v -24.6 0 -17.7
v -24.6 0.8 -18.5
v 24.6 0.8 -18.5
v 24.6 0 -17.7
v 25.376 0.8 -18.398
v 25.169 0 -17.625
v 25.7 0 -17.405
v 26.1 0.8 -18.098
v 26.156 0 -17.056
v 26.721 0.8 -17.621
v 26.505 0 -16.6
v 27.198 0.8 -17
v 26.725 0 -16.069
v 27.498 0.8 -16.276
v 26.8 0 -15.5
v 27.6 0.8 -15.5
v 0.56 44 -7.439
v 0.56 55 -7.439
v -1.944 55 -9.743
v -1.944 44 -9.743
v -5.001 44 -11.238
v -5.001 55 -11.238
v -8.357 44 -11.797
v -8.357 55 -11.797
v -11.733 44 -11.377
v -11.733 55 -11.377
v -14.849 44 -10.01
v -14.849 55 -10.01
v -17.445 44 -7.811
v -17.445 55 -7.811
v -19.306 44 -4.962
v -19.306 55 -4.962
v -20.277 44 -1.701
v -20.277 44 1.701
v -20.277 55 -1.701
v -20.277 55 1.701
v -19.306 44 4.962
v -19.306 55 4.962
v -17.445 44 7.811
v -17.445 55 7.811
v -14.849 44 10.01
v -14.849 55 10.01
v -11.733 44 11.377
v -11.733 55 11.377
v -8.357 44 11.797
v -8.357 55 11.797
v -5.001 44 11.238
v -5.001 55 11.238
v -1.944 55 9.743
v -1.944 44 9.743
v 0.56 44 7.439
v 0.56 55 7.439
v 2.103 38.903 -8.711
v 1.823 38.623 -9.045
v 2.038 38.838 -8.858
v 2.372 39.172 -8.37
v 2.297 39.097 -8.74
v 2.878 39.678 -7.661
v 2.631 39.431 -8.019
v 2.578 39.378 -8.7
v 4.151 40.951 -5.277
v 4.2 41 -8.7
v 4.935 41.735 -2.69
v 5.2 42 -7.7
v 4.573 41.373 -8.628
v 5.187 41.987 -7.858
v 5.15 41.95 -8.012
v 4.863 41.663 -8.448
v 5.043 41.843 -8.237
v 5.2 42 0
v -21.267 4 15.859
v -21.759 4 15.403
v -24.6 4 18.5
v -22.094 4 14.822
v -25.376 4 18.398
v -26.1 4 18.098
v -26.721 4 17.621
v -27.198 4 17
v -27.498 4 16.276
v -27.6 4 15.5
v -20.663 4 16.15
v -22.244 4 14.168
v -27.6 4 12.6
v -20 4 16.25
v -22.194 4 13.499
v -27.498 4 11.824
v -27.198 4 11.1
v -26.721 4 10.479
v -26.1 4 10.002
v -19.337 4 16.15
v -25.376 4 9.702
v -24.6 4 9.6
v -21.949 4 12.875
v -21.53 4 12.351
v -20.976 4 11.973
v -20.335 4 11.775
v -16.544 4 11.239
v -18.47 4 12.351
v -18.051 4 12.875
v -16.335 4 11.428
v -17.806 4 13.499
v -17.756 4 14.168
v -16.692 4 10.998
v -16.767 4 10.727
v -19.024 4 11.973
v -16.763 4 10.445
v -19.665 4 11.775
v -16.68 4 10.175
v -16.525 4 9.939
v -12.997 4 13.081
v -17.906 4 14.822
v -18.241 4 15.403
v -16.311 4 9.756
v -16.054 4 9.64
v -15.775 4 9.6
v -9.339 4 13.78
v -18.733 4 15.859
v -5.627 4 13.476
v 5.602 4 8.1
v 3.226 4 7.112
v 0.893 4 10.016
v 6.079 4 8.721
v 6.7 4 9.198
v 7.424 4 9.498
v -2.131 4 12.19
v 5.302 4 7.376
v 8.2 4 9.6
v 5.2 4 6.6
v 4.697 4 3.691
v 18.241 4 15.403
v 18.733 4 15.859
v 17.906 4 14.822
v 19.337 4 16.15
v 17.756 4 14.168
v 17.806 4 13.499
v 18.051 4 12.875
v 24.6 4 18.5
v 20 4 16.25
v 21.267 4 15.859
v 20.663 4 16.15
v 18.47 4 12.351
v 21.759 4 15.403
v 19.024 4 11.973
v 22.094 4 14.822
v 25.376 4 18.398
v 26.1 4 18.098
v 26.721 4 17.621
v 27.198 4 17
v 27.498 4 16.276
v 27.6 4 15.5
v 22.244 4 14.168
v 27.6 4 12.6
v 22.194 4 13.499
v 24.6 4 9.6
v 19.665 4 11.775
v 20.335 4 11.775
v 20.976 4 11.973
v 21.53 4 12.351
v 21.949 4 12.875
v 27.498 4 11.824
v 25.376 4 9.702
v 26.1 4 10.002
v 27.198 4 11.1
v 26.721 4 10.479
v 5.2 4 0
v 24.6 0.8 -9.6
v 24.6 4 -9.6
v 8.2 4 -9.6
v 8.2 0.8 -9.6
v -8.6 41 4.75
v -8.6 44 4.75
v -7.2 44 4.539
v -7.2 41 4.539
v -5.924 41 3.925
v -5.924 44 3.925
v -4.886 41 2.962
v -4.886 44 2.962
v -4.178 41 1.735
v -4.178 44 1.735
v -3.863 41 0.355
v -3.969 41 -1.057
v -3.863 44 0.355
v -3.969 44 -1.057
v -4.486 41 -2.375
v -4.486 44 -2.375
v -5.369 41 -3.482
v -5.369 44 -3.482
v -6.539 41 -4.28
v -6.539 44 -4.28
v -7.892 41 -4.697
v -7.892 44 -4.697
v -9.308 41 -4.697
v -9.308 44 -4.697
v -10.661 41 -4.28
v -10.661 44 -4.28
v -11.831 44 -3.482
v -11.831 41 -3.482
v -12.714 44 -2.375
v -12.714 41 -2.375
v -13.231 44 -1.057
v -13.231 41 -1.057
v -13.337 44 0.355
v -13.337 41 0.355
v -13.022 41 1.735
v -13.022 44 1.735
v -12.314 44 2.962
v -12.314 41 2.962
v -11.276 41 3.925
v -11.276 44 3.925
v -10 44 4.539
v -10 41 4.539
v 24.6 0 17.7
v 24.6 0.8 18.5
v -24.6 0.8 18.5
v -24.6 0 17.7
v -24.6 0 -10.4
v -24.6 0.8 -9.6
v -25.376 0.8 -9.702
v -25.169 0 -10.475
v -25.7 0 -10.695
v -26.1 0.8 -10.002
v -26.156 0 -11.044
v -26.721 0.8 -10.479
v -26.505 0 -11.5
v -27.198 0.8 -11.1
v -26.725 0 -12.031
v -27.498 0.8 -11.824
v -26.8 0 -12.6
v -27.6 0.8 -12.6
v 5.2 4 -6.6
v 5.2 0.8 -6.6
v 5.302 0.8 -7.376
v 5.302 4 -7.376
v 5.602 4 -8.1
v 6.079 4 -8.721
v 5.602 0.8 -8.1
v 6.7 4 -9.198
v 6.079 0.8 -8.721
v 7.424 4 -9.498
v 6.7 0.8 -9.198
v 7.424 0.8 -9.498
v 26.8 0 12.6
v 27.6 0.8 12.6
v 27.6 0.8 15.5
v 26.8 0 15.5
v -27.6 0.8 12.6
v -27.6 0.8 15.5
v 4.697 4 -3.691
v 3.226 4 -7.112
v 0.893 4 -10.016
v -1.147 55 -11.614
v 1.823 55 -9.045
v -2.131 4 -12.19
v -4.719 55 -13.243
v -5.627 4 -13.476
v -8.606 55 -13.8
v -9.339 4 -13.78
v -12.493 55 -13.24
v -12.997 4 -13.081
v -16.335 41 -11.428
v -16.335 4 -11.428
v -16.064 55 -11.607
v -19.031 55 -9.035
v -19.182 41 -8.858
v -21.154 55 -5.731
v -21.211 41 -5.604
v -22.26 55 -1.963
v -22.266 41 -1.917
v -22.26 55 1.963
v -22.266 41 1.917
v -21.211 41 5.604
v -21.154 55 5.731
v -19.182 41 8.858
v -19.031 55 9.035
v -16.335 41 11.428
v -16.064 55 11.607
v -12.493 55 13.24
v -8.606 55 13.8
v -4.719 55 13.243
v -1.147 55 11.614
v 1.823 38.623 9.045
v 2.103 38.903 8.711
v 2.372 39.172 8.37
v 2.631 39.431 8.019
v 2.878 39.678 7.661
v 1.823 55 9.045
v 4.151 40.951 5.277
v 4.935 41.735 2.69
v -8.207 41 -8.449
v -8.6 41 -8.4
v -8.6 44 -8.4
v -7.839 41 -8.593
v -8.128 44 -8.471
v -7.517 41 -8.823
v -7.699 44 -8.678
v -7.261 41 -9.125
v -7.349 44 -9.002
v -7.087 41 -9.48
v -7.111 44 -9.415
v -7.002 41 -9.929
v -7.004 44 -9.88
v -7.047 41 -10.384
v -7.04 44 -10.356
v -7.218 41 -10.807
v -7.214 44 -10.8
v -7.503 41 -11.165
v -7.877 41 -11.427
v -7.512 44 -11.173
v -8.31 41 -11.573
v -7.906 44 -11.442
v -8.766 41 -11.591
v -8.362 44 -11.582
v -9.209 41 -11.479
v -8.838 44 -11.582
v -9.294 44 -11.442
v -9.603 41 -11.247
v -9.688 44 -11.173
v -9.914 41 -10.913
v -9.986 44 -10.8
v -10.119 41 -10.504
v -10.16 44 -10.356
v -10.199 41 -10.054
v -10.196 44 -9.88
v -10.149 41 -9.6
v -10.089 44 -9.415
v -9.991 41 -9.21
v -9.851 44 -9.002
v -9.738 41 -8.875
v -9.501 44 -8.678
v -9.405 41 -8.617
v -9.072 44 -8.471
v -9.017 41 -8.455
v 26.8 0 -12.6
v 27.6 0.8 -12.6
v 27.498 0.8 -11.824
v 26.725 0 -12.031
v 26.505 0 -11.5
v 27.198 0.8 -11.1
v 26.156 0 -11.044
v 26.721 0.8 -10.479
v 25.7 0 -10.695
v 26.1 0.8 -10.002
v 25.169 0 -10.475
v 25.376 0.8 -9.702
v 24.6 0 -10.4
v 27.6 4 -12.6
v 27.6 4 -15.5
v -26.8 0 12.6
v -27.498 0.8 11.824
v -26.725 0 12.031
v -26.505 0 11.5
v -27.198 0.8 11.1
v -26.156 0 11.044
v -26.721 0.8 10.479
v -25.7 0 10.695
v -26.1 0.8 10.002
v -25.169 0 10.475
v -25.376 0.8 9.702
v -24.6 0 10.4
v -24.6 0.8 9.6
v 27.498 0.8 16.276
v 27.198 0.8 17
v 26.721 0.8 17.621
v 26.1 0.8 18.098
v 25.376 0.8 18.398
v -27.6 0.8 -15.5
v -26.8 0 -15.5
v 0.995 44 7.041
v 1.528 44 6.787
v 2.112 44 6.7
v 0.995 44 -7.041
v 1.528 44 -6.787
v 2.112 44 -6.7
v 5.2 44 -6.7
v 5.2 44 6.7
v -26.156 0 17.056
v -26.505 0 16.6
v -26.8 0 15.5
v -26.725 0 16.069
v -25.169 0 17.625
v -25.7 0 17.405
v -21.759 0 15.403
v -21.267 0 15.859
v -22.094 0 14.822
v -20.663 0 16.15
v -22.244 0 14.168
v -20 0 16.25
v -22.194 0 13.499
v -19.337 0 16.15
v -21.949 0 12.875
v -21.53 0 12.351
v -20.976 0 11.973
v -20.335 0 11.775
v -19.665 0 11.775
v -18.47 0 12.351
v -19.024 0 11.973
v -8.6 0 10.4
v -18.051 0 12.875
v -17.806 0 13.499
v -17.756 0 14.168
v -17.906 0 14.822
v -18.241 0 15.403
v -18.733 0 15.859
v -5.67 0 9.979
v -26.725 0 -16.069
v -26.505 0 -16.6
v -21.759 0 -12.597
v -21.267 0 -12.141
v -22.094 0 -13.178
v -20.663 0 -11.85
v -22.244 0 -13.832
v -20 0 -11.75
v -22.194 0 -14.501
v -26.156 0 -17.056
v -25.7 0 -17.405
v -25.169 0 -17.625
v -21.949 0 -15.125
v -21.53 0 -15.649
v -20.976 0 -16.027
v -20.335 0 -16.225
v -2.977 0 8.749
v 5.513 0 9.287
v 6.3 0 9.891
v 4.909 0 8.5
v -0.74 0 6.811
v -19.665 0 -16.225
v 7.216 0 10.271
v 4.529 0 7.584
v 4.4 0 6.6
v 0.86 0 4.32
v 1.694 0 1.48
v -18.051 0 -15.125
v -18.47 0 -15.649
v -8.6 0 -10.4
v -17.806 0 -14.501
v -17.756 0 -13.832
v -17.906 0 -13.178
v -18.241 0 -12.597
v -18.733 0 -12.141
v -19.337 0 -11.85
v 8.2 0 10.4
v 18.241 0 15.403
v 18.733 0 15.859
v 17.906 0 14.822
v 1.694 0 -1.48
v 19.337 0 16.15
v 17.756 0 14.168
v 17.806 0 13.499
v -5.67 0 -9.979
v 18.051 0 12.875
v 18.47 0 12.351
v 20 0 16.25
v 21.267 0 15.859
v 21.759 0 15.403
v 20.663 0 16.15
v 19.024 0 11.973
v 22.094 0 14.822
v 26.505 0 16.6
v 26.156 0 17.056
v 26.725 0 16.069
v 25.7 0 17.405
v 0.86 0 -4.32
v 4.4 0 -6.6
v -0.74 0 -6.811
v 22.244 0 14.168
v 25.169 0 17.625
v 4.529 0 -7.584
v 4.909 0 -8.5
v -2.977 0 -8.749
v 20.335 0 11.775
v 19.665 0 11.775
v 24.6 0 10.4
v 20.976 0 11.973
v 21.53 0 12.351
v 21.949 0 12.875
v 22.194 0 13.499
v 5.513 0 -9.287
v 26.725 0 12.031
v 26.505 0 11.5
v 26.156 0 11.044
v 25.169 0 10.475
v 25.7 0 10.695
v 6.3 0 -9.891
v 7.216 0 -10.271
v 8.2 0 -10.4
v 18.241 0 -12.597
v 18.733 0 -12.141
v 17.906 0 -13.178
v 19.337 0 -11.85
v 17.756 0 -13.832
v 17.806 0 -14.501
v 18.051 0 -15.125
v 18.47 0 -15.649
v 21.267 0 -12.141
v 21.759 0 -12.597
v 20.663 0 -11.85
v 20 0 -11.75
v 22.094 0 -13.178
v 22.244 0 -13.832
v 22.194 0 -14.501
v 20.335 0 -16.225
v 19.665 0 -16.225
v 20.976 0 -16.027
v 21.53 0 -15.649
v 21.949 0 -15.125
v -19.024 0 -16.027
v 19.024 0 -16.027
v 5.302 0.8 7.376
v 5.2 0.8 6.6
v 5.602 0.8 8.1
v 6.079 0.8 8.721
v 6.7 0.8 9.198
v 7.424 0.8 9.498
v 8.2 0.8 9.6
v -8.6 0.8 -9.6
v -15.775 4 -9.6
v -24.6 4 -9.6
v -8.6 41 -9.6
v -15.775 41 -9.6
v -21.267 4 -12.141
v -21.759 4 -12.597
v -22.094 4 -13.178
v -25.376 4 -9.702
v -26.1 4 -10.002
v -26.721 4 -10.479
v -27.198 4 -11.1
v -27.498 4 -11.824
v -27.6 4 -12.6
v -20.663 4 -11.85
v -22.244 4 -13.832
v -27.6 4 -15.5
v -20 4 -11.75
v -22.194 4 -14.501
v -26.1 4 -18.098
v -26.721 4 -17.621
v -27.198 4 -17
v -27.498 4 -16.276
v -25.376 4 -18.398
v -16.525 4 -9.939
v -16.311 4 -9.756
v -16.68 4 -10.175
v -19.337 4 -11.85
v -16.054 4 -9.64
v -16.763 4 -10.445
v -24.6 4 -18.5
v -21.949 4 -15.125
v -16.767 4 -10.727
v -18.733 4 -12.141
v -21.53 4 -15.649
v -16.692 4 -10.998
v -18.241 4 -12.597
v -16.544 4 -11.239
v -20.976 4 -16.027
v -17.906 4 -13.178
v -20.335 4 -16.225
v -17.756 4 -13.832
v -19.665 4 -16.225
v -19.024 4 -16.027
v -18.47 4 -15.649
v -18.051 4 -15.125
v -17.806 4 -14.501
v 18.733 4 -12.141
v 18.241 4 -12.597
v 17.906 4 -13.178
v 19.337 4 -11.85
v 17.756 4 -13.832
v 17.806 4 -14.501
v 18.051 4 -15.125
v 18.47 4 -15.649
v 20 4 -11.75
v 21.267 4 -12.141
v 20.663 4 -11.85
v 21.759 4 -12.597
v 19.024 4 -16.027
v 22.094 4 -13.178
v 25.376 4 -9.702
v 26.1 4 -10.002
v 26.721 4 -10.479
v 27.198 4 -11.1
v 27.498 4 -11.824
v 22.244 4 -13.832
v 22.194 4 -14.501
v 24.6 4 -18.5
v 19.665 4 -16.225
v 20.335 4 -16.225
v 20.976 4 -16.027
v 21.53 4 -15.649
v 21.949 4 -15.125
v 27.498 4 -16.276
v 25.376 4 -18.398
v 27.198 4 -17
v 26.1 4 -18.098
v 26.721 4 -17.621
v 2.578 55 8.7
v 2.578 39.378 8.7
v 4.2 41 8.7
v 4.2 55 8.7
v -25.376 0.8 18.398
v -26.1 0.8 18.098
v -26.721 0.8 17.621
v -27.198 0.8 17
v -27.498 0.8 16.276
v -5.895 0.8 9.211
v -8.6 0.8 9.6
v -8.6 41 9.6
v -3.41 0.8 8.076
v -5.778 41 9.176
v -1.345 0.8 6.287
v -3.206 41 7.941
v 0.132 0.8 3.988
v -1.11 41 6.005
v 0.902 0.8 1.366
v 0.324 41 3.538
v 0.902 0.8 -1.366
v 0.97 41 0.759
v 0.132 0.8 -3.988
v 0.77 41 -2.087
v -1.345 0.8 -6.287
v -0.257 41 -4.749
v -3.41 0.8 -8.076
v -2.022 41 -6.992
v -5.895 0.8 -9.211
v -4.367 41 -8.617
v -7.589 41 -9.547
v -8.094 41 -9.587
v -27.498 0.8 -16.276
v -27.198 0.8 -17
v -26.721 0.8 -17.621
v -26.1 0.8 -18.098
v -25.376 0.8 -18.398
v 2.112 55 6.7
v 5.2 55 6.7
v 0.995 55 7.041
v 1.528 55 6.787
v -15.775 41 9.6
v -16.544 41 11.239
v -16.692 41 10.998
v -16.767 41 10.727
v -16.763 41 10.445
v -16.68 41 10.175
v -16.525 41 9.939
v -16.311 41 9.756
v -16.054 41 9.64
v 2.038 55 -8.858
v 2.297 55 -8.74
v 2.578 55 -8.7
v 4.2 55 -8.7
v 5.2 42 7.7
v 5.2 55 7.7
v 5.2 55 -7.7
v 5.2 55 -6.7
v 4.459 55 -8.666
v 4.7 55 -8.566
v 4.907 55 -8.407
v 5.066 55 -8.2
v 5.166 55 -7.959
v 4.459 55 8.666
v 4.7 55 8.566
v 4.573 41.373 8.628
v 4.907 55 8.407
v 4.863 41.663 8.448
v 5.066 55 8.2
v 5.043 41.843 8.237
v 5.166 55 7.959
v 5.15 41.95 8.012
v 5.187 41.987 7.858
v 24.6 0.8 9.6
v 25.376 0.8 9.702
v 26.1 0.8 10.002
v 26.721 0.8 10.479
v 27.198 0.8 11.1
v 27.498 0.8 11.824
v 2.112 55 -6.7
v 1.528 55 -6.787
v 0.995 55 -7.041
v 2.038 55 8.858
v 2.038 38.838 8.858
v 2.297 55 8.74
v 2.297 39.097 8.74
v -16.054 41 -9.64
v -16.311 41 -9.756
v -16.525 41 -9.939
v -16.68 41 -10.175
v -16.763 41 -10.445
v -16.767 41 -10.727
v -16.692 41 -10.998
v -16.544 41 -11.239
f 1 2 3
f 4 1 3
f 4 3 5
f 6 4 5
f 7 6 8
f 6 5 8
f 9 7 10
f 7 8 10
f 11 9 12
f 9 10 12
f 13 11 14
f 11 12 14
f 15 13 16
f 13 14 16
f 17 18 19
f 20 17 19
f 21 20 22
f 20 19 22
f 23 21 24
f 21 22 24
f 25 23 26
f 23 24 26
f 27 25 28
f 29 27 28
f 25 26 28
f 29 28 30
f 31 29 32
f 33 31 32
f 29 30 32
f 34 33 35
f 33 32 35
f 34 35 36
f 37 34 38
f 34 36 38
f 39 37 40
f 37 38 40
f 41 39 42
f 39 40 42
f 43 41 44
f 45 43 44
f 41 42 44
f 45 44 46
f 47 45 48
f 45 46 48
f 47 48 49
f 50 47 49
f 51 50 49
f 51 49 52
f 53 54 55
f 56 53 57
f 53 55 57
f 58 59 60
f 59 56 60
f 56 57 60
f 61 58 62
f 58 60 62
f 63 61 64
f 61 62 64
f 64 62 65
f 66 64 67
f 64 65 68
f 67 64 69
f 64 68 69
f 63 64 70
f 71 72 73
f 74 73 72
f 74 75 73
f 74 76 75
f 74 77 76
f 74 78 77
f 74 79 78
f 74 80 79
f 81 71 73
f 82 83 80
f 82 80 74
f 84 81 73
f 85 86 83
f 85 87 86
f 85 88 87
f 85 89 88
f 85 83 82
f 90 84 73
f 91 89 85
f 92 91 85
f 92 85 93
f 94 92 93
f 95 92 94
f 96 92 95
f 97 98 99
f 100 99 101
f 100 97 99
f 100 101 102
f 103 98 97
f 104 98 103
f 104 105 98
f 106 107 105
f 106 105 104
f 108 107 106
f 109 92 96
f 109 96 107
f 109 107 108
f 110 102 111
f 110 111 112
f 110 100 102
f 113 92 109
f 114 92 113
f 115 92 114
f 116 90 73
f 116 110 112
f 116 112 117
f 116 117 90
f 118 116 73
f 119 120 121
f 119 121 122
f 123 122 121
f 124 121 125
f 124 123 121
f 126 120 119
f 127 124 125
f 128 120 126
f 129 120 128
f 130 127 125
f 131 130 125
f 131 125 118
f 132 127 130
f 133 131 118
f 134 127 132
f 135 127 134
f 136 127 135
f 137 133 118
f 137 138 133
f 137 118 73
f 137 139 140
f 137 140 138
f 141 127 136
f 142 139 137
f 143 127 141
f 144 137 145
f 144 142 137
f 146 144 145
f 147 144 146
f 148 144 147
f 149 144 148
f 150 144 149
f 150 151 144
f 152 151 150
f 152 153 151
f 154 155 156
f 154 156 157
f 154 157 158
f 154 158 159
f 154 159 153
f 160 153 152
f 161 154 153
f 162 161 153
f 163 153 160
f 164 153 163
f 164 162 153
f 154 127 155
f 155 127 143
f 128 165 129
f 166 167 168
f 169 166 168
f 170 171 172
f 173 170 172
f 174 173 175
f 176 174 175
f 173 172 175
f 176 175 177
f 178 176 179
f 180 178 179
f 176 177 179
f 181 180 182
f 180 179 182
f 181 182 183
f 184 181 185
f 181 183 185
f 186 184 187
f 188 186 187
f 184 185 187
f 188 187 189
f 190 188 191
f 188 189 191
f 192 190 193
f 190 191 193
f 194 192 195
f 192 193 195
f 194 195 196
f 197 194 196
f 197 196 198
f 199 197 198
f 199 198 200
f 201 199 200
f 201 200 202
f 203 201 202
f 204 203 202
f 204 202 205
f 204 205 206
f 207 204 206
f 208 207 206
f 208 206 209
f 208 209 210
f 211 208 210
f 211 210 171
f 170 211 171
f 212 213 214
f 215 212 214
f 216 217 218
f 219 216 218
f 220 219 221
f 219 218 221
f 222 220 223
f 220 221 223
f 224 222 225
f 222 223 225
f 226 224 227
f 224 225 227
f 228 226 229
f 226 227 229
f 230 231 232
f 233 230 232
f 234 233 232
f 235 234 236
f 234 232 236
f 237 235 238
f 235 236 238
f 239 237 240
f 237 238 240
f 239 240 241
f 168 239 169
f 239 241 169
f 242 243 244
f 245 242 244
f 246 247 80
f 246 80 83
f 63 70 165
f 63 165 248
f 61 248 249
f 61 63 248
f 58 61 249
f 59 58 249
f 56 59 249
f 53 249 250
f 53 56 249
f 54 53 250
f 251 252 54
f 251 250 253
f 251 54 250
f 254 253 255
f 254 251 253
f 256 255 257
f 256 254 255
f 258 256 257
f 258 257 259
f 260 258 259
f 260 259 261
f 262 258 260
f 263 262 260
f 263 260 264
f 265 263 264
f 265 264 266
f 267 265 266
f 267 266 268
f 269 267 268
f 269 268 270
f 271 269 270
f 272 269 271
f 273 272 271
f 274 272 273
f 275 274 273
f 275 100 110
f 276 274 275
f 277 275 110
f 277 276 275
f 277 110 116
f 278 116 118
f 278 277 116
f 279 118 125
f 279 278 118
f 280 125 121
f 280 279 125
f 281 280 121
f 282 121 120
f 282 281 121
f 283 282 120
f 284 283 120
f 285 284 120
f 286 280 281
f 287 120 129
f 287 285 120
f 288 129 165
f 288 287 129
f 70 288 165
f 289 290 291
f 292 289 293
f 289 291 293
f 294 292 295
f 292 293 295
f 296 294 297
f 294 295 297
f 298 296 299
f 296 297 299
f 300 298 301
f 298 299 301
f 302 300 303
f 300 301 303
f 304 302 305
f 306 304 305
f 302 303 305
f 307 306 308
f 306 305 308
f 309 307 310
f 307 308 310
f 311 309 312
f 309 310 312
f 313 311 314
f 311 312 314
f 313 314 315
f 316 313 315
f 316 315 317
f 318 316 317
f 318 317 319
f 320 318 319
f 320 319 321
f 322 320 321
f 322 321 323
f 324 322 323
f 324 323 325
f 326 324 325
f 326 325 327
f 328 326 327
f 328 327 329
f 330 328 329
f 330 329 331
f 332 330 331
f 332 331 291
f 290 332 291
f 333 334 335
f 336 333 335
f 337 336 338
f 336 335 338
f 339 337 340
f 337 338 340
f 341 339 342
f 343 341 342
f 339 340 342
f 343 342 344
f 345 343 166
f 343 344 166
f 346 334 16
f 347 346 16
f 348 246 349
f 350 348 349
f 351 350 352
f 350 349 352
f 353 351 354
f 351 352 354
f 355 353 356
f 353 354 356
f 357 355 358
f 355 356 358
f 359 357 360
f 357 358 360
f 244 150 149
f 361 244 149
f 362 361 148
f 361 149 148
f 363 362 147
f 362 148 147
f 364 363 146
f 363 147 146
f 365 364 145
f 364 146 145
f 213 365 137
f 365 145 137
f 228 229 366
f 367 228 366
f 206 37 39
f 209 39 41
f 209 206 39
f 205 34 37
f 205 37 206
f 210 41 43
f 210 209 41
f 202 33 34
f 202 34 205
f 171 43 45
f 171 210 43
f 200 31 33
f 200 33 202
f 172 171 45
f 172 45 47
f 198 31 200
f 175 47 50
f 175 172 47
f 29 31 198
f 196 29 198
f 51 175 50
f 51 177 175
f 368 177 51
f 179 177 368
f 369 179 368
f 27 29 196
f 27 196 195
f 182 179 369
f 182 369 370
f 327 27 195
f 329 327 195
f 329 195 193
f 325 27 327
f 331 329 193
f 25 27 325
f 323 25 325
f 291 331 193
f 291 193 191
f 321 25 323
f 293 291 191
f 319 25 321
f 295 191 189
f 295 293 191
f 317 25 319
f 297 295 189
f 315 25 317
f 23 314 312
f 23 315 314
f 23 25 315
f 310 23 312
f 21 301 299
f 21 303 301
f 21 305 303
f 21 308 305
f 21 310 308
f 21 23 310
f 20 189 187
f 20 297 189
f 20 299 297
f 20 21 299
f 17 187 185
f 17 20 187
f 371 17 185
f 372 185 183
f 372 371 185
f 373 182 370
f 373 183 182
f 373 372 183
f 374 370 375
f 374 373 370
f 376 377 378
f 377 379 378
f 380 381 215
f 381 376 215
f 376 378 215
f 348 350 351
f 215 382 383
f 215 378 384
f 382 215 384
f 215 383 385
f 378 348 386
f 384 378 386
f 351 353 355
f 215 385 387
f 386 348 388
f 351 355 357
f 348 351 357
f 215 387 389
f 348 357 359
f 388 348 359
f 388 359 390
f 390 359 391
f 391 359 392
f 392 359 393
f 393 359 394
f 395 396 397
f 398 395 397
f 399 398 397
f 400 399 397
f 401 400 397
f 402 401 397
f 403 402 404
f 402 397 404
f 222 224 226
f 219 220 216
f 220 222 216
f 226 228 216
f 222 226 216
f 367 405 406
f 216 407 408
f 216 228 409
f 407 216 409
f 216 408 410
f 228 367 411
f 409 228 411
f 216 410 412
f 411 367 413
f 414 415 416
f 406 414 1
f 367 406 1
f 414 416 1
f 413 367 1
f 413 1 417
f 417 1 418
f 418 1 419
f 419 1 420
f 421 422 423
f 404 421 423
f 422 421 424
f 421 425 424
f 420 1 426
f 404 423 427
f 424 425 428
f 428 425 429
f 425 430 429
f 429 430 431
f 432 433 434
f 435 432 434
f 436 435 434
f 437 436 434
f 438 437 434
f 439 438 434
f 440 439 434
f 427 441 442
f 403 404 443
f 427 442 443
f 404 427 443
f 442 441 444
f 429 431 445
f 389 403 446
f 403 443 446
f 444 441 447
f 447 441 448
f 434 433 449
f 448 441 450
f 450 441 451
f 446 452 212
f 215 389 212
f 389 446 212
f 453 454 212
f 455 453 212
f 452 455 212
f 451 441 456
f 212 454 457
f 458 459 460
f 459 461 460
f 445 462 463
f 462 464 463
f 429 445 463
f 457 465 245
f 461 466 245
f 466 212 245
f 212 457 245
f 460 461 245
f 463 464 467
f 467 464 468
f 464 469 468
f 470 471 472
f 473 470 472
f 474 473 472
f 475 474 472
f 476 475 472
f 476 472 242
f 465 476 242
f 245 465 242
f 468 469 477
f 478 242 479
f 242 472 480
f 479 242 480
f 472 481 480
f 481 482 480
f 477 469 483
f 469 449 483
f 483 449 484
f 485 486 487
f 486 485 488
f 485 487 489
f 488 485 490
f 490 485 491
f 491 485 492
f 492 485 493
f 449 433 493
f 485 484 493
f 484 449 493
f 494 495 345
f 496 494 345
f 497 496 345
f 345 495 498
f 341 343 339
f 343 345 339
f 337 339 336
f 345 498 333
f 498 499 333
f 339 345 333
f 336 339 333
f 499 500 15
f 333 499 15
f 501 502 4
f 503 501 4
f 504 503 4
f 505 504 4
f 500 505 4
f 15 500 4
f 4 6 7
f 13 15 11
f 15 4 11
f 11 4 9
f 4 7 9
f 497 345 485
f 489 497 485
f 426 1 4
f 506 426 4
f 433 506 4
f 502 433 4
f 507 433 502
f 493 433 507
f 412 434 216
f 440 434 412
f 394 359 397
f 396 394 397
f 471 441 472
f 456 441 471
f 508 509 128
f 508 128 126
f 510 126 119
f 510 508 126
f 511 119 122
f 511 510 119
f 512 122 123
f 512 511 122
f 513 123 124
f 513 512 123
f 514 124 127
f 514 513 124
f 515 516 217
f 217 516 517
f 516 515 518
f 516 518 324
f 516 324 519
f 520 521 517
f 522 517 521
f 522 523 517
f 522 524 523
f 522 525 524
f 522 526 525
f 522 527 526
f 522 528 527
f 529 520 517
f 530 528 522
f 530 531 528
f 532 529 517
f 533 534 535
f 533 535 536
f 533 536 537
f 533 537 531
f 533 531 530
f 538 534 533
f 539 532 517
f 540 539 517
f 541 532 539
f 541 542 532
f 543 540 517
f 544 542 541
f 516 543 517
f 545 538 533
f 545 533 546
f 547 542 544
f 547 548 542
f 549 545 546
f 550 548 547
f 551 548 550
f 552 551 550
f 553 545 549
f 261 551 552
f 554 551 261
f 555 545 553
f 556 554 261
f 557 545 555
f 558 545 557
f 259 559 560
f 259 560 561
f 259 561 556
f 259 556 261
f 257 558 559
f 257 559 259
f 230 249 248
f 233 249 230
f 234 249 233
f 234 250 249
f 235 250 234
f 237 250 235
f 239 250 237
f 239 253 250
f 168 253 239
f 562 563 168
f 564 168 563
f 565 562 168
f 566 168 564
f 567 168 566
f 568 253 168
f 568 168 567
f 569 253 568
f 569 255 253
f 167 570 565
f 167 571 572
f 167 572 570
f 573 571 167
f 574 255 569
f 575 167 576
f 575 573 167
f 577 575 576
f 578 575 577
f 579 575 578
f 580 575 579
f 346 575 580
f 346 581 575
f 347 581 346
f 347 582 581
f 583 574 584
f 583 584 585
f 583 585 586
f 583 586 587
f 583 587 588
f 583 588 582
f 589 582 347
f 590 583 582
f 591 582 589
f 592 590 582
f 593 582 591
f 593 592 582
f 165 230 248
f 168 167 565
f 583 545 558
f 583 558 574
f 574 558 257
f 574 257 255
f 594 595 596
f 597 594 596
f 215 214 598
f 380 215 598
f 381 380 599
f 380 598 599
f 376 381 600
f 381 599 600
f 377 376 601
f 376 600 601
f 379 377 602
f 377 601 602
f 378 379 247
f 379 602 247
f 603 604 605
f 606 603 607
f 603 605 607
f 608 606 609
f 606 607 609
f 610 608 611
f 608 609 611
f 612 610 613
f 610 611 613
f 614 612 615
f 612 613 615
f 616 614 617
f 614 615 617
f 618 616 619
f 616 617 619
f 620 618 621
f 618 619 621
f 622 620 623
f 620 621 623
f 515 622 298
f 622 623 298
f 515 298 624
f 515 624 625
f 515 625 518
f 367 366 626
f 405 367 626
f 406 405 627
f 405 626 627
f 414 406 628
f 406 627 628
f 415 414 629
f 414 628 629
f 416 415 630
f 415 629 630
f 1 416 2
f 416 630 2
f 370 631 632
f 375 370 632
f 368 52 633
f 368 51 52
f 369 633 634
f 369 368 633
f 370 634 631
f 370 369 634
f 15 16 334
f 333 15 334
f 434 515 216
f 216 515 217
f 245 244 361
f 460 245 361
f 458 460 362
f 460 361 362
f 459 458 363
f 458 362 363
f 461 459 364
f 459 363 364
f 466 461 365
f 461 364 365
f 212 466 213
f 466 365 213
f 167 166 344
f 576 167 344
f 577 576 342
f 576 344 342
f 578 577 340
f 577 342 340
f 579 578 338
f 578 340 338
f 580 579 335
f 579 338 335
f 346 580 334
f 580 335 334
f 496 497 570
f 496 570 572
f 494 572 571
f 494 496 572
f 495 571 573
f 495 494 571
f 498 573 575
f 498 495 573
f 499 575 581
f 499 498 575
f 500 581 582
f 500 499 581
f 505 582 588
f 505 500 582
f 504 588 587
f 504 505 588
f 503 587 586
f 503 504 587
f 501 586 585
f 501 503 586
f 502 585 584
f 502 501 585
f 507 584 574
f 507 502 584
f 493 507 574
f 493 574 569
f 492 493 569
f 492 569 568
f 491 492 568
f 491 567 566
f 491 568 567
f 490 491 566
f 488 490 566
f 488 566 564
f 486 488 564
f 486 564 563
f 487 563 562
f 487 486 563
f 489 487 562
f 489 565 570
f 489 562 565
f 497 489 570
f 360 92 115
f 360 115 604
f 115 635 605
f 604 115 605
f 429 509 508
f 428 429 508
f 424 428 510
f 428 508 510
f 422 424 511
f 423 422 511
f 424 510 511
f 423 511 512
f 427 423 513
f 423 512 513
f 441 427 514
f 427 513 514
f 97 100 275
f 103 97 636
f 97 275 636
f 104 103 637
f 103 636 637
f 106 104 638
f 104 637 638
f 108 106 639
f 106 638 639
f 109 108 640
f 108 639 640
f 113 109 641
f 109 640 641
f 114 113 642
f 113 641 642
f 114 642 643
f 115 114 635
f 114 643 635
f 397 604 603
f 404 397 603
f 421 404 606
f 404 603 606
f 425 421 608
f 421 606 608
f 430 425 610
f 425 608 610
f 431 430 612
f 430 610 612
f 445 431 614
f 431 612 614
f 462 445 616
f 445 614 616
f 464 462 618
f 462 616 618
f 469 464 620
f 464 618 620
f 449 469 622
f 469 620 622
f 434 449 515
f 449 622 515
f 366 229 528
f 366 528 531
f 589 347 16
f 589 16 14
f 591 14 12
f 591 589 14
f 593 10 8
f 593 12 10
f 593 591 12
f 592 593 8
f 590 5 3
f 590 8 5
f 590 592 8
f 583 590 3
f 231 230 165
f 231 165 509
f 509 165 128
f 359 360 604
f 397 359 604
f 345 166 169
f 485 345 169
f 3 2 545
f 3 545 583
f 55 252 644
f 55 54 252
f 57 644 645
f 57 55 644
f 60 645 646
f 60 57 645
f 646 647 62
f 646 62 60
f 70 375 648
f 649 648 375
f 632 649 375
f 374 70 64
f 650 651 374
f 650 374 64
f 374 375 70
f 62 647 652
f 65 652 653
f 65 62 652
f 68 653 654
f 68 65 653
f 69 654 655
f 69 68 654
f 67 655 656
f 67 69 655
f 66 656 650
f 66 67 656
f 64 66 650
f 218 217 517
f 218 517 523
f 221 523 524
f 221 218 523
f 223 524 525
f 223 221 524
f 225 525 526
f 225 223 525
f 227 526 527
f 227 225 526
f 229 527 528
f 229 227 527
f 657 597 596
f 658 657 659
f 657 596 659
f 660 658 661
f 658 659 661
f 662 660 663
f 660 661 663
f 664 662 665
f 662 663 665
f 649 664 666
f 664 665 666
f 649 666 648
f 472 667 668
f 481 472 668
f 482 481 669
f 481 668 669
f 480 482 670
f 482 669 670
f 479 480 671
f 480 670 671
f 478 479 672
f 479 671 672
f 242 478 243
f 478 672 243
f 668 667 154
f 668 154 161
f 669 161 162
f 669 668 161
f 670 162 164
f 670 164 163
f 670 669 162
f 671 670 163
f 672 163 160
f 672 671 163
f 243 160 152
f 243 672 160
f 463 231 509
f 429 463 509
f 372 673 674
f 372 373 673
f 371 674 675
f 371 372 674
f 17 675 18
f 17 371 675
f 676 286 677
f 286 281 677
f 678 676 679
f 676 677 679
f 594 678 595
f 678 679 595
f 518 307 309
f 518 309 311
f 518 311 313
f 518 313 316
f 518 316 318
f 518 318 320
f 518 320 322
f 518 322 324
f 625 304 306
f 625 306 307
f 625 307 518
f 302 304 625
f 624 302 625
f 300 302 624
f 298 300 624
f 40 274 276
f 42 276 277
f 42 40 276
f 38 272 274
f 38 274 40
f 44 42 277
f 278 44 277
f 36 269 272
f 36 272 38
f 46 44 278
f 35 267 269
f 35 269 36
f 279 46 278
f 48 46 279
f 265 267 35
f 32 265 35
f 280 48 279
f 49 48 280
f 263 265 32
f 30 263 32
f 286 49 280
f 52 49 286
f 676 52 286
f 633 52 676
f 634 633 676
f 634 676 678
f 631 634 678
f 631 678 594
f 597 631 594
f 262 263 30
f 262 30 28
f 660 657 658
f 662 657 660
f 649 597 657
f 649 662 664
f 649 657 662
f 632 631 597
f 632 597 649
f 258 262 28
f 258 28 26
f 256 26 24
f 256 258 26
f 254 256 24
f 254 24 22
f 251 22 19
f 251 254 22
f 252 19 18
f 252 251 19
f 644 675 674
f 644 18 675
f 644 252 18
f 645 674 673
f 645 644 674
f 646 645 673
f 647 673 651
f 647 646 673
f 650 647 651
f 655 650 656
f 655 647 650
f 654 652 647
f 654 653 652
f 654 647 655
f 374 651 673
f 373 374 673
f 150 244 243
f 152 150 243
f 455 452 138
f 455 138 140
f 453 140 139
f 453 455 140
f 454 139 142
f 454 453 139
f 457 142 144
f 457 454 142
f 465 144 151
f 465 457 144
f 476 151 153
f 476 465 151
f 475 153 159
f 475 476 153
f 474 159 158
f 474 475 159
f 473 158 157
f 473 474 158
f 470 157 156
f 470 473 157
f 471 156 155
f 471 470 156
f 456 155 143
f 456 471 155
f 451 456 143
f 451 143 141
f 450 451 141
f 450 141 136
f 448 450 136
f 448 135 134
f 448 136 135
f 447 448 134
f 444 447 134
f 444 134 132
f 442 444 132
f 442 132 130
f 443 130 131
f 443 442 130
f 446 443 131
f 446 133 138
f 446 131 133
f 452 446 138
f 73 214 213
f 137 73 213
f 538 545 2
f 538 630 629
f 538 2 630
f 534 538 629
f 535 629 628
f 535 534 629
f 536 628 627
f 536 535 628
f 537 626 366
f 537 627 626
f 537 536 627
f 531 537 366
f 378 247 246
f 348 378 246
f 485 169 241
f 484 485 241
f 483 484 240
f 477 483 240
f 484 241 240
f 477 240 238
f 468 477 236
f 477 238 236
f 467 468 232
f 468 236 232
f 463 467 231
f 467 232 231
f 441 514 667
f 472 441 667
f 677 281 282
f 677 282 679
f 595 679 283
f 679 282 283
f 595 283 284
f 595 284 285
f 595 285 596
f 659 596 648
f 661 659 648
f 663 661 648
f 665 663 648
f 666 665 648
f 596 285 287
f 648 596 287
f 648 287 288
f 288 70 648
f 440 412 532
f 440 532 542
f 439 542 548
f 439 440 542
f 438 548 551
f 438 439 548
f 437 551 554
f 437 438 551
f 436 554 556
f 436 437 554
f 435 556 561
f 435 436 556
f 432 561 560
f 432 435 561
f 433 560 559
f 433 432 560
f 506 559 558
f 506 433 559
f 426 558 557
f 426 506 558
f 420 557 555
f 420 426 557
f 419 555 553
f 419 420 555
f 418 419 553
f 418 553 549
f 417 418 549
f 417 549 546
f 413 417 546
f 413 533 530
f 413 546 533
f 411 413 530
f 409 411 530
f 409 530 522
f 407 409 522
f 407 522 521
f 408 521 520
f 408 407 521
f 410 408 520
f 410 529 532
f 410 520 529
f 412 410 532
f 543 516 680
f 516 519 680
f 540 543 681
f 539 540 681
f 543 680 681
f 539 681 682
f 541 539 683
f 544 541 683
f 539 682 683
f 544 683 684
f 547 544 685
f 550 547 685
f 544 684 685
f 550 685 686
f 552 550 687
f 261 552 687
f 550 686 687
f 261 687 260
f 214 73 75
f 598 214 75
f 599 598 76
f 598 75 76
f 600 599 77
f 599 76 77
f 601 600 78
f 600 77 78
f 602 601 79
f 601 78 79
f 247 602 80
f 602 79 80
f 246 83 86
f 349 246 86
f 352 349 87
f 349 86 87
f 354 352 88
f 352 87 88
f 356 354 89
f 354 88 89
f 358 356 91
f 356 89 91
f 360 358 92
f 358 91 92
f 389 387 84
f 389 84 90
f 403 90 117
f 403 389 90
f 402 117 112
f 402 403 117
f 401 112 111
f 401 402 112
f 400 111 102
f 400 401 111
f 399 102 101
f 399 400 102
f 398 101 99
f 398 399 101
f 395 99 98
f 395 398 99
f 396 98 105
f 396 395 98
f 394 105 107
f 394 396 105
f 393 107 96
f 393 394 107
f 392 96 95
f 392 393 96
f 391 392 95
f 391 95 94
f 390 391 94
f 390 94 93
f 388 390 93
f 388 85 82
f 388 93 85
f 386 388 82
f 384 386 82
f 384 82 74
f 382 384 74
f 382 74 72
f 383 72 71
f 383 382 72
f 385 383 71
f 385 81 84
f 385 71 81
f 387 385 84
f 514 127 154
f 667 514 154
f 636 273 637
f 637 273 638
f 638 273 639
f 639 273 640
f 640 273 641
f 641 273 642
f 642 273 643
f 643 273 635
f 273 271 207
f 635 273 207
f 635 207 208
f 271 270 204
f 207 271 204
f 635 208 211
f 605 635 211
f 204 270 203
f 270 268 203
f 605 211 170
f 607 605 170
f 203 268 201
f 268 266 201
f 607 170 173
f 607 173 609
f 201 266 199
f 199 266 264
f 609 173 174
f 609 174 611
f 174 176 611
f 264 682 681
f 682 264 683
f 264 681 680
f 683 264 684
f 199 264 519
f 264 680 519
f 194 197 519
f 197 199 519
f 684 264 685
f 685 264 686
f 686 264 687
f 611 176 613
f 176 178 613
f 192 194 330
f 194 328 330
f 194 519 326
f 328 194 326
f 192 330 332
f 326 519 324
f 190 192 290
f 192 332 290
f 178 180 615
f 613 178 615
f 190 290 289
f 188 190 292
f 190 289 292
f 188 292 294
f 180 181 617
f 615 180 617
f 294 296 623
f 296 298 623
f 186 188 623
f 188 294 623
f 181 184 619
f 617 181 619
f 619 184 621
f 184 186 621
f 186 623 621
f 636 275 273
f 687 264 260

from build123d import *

# Parameters (mm, degrees)
SKETCH5_R                = 13.8
BOSS_EXTRUDE10_DEPTH     = 55
BOSS_EXTRUDE13_DEPTH     = 13
SKETCH7_W                = 55.2
SKETCH7_H                = 37
BOSS_EXTRUDE11_DEPTH     = 4
SKETCH14_R               = 9.6
CUT_EXTRUDE9_DEPTH       = 53.773193953
FILLET1_R                = 1
FILLET3_R                = 3
CUT_EXTRUDE11_DEPTH      = 65.257373118
CUT_EXTRUDE11_DEPTH_BACK = 65.257373118
SKETCH2_R                = 2.25
CUT_EXTRUDE12_DEPTH      = 11
CHAMFER1_SIZE            = 0.8
FILLET7_R                = 1
SKETCH16_R               = 4.75
CUT_EXTRUDE13_DEPTH      = 56.136285693
SKETCH17_R               = 1.6
CUT_EXTRUDE14_DEPTH      = 3
FILLET8_R                = 2
DRAFT1_ANGLE             = 45


with BuildPart() as part:
    # Sketch5 → Boss-Extrude10 (new body)
    with BuildSketch(Plane(origin=(0, 55, 0), x_dir=(1, 0, 0), z_dir=(0, 1, 0))):
        with Locations((-8.6, 0)):
            Circle(SKETCH5_R)
    extrude(amount=-BOSS_EXTRUDE10_DEPTH)

    # Sketch5<9> → Boss-Extrude13 (add)
    with BuildSketch(Plane(origin=(0, 55, 0), x_dir=(1, 0, 0), z_dir=(0, 1, 0))):
        with BuildLine():
            Line((5.2, -8.7), (5.2, 8.4e-08))
            ThreePointArc((5.2, 8.4e-08), (4.405144544, -4.615865618), (2.112142643, -8.7))
            Line((2.112142643, -8.7), (5.2, -8.7))
        make_face()
        with BuildLine():
            Line((5.2, 8.4e-08), (5.2, 8.7))
            Line((5.2, 8.7), (2.112142643, 8.7))
            ThreePointArc((2.112142643, 8.7), (4.405144516, 4.615865697), (5.2, 8.4e-08))
        make_face()
    extrude(amount=-BOSS_EXTRUDE13_DEPTH)

    # Sketch7 → Boss-Extrude11 (add)
    with BuildSketch(Plane(origin=(0, 0, 0), x_dir=(1, 0, 0), z_dir=(0, 1, 0))):
        Rectangle(SKETCH7_W, SKETCH7_H)
    extrude(amount=BOSS_EXTRUDE11_DEPTH)

    # Sketch14 → Cut-Extrude9 (cut, through all)
    with BuildSketch(Plane(origin=(0, 41, 0), x_dir=(1, 0, 0), z_dir=(0, 1, 0))):
        with BuildLine():
            Line((-28.6, -9.6), (-8.6, -9.6))
            ThreePointArc((-8.6, -9.6), (-18.2, 0), (-8.6, 9.6))
            Line((-8.6, 9.6), (-28.6, 9.6))
            Line((-28.6, 9.6), (-28.6, -9.6))
        make_face()
        with Locations((-8.6, 0)):
            Circle(SKETCH14_R)
        Polygon((5.2, -9.6), (27.6, -9.6), (27.6, 9.6), (5.2, 9.6), (5.2, 0), align=None)
    extrude(amount=-CUT_EXTRUDE9_DEPTH, mode=Mode.SUBTRACT)

    # Fillet1
    fillet1_edges = [part.edges().sort_by_distance(p)[0] for p in [
        (-18.513626985, 22.5, -9.6),
        (-18.513626985, 22.5, 9.6),
    ]]
    fillet(fillet1_edges, radius=FILLET1_R)

    # Fillet3
    fillet3_edges = [part.edges().sort_by_distance(p)[0] for p in [
        (27.6, 2, -18.5),
        (-27.6, 2, -18.5),
        (-27.6, 2, 18.5),
        (27.6, 2, 18.5),
        (-27.6, 2, -9.6),
        (-27.6, 2, 9.6),
        (5.2, 2, 9.6),
        (5.2, 2, -9.6),
        (27.6, 2, -9.6),
        (27.6, 2, 9.6),
    ]]
    fillet(fillet3_edges, radius=FILLET3_R)

    # Sketch2 → Cut-Extrude11 (cut, two sides: drawn at the far end of the back side and taken through both)
    with BuildSketch(Plane(origin=(0, 0, 0), x_dir=(1, 0, 0), z_dir=(0, 1, 0)).offset(-CUT_EXTRUDE11_DEPTH_BACK)):
        with Locations(Location((-20, 14, 0), (0, 0, 270))):
            Circle(SKETCH2_R)
        with Locations(Location((20, 14, 0), (0, 0, 270))):
            Circle(SKETCH2_R)
        with Locations(Location((20, -14, 0), (0, 0, 270))):
            Circle(SKETCH2_R)
        with Locations(Location((-20, -14, 0), (0, 0, 270))):
            Circle(SKETCH2_R)
    extrude(amount=CUT_EXTRUDE11_DEPTH + CUT_EXTRUDE11_DEPTH_BACK, mode=Mode.SUBTRACT)

    # Sketch15 → Cut-Extrude12 (cut)
    with BuildSketch(Plane(origin=(0, 55, 0), x_dir=(1, 0, 0), z_dir=(0, 1, 0))):
        with BuildLine():
            Line((4.1, -6.7), (5.2, -6.7))
            Line((5.2, -6.7), (5.2, 6.7))
            Line((5.2, 6.7), (4.1, 6.7))
            Line((4.1, 6.7), (1.113392816, 6.7))
            ThreePointArc((1.113392816, 6.7), (-20.4, 0), (1.113392816, -6.7))
            Line((1.113392816, -6.7), (4.1, -6.7))
        make_face()
    extrude(amount=-CUT_EXTRUDE12_DEPTH, mode=Mode.SUBTRACT)

    # Chamfer1
    chamfer1_edges = [part.edges().sort_by_distance(p)[0] for p in [
        (16.4, 0, -9.6),
        (27.6, 0, -14.05),
        (-27.6, 0, -14.05),
        (0, 0, -18.5),
        (5.2, 0, 0),
        (16.4, 0, 9.6),
        (27.6, 0, 14.05),
        (0, 0, 18.5),
        (-27.6, 0, 14.05),
        (-26.721320344, 0, 17.621320344),
        (26.721320344, 0, 17.621320344),
        (26.721320344, 0, -17.621320344),
        (-26.721320344, 0, -17.621320344),
        (-26.721320344, 0, -10.478679656),
        (-26.721320344, 0, 10.478679656),
        (26.721320344, 0, 10.478679656),
        (26.721320344, 0, -10.478679656),
        (6.078679656, 0, -8.721320344),
        (6.078679656, 0, 8.721320344),
        (-16.6, 0, 9.6),
        (-16.6, 0, -9.6),
        (1, 0, 0),
    ]]
    chamfer(chamfer1_edges, length=CHAMFER1_SIZE)

    # Fillet7
    fillet7_edges = [part.edges().sort_by_distance(p)[0] for p in [
        (5.2, 48.5, 8.7),
        (2.112142643, 48.5, 8.7),
        (2.112142643, 48.5, -8.7),
        (5.2, 48.5, -8.7),
    ]]
    fillet(fillet7_edges, radius=FILLET7_R)

    # Sketch16 → Cut-Extrude13 (cut, through all)
    with BuildSketch(Plane(origin=(0, 44, 0), x_dir=(1, 0, 0), z_dir=(0, 1, 0))):
        with Locations(Location((-8.6, 0, 0), (0, 0, 270))):
            Circle(SKETCH16_R)
    extrude(amount=-CUT_EXTRUDE13_DEPTH, mode=Mode.SUBTRACT)

    # Sketch17 → Cut-Extrude14 (cut)
    with BuildSketch(Plane(origin=(0, 44, 0), x_dir=(1, 0, 0), z_dir=(0, 1, 0))):
        with Locations(Location((-8.6, 10, 0), (0, 0, 270))):
            Circle(SKETCH17_R)
    extrude(amount=-CUT_EXTRUDE14_DEPTH, mode=Mode.SUBTRACT)

    # Fillet8
    fillet8_edges = [part.edges().sort_by_distance(p)[0] for p in [
        (1.113392816, 49.5, -6.7),
        (1.113392816, 49.5, 6.7),
    ]]
    fillet(fillet8_edges, radius=FILLET8_R)

    # Draft1
    draft1_faces = [part.faces().sort_by_distance(p)[0] for p in [
        (4.269454108, 42, -6.535437948),
        (4.269454108, 42, 6.535437948),
    ]]
    draft(draft1_faces, Plane(origin=(5.2, 42, 0), x_dir=(0, 0, 1), z_dir=(1, 0, 0)), DRAFT1_ANGLE)


solid = part.part
